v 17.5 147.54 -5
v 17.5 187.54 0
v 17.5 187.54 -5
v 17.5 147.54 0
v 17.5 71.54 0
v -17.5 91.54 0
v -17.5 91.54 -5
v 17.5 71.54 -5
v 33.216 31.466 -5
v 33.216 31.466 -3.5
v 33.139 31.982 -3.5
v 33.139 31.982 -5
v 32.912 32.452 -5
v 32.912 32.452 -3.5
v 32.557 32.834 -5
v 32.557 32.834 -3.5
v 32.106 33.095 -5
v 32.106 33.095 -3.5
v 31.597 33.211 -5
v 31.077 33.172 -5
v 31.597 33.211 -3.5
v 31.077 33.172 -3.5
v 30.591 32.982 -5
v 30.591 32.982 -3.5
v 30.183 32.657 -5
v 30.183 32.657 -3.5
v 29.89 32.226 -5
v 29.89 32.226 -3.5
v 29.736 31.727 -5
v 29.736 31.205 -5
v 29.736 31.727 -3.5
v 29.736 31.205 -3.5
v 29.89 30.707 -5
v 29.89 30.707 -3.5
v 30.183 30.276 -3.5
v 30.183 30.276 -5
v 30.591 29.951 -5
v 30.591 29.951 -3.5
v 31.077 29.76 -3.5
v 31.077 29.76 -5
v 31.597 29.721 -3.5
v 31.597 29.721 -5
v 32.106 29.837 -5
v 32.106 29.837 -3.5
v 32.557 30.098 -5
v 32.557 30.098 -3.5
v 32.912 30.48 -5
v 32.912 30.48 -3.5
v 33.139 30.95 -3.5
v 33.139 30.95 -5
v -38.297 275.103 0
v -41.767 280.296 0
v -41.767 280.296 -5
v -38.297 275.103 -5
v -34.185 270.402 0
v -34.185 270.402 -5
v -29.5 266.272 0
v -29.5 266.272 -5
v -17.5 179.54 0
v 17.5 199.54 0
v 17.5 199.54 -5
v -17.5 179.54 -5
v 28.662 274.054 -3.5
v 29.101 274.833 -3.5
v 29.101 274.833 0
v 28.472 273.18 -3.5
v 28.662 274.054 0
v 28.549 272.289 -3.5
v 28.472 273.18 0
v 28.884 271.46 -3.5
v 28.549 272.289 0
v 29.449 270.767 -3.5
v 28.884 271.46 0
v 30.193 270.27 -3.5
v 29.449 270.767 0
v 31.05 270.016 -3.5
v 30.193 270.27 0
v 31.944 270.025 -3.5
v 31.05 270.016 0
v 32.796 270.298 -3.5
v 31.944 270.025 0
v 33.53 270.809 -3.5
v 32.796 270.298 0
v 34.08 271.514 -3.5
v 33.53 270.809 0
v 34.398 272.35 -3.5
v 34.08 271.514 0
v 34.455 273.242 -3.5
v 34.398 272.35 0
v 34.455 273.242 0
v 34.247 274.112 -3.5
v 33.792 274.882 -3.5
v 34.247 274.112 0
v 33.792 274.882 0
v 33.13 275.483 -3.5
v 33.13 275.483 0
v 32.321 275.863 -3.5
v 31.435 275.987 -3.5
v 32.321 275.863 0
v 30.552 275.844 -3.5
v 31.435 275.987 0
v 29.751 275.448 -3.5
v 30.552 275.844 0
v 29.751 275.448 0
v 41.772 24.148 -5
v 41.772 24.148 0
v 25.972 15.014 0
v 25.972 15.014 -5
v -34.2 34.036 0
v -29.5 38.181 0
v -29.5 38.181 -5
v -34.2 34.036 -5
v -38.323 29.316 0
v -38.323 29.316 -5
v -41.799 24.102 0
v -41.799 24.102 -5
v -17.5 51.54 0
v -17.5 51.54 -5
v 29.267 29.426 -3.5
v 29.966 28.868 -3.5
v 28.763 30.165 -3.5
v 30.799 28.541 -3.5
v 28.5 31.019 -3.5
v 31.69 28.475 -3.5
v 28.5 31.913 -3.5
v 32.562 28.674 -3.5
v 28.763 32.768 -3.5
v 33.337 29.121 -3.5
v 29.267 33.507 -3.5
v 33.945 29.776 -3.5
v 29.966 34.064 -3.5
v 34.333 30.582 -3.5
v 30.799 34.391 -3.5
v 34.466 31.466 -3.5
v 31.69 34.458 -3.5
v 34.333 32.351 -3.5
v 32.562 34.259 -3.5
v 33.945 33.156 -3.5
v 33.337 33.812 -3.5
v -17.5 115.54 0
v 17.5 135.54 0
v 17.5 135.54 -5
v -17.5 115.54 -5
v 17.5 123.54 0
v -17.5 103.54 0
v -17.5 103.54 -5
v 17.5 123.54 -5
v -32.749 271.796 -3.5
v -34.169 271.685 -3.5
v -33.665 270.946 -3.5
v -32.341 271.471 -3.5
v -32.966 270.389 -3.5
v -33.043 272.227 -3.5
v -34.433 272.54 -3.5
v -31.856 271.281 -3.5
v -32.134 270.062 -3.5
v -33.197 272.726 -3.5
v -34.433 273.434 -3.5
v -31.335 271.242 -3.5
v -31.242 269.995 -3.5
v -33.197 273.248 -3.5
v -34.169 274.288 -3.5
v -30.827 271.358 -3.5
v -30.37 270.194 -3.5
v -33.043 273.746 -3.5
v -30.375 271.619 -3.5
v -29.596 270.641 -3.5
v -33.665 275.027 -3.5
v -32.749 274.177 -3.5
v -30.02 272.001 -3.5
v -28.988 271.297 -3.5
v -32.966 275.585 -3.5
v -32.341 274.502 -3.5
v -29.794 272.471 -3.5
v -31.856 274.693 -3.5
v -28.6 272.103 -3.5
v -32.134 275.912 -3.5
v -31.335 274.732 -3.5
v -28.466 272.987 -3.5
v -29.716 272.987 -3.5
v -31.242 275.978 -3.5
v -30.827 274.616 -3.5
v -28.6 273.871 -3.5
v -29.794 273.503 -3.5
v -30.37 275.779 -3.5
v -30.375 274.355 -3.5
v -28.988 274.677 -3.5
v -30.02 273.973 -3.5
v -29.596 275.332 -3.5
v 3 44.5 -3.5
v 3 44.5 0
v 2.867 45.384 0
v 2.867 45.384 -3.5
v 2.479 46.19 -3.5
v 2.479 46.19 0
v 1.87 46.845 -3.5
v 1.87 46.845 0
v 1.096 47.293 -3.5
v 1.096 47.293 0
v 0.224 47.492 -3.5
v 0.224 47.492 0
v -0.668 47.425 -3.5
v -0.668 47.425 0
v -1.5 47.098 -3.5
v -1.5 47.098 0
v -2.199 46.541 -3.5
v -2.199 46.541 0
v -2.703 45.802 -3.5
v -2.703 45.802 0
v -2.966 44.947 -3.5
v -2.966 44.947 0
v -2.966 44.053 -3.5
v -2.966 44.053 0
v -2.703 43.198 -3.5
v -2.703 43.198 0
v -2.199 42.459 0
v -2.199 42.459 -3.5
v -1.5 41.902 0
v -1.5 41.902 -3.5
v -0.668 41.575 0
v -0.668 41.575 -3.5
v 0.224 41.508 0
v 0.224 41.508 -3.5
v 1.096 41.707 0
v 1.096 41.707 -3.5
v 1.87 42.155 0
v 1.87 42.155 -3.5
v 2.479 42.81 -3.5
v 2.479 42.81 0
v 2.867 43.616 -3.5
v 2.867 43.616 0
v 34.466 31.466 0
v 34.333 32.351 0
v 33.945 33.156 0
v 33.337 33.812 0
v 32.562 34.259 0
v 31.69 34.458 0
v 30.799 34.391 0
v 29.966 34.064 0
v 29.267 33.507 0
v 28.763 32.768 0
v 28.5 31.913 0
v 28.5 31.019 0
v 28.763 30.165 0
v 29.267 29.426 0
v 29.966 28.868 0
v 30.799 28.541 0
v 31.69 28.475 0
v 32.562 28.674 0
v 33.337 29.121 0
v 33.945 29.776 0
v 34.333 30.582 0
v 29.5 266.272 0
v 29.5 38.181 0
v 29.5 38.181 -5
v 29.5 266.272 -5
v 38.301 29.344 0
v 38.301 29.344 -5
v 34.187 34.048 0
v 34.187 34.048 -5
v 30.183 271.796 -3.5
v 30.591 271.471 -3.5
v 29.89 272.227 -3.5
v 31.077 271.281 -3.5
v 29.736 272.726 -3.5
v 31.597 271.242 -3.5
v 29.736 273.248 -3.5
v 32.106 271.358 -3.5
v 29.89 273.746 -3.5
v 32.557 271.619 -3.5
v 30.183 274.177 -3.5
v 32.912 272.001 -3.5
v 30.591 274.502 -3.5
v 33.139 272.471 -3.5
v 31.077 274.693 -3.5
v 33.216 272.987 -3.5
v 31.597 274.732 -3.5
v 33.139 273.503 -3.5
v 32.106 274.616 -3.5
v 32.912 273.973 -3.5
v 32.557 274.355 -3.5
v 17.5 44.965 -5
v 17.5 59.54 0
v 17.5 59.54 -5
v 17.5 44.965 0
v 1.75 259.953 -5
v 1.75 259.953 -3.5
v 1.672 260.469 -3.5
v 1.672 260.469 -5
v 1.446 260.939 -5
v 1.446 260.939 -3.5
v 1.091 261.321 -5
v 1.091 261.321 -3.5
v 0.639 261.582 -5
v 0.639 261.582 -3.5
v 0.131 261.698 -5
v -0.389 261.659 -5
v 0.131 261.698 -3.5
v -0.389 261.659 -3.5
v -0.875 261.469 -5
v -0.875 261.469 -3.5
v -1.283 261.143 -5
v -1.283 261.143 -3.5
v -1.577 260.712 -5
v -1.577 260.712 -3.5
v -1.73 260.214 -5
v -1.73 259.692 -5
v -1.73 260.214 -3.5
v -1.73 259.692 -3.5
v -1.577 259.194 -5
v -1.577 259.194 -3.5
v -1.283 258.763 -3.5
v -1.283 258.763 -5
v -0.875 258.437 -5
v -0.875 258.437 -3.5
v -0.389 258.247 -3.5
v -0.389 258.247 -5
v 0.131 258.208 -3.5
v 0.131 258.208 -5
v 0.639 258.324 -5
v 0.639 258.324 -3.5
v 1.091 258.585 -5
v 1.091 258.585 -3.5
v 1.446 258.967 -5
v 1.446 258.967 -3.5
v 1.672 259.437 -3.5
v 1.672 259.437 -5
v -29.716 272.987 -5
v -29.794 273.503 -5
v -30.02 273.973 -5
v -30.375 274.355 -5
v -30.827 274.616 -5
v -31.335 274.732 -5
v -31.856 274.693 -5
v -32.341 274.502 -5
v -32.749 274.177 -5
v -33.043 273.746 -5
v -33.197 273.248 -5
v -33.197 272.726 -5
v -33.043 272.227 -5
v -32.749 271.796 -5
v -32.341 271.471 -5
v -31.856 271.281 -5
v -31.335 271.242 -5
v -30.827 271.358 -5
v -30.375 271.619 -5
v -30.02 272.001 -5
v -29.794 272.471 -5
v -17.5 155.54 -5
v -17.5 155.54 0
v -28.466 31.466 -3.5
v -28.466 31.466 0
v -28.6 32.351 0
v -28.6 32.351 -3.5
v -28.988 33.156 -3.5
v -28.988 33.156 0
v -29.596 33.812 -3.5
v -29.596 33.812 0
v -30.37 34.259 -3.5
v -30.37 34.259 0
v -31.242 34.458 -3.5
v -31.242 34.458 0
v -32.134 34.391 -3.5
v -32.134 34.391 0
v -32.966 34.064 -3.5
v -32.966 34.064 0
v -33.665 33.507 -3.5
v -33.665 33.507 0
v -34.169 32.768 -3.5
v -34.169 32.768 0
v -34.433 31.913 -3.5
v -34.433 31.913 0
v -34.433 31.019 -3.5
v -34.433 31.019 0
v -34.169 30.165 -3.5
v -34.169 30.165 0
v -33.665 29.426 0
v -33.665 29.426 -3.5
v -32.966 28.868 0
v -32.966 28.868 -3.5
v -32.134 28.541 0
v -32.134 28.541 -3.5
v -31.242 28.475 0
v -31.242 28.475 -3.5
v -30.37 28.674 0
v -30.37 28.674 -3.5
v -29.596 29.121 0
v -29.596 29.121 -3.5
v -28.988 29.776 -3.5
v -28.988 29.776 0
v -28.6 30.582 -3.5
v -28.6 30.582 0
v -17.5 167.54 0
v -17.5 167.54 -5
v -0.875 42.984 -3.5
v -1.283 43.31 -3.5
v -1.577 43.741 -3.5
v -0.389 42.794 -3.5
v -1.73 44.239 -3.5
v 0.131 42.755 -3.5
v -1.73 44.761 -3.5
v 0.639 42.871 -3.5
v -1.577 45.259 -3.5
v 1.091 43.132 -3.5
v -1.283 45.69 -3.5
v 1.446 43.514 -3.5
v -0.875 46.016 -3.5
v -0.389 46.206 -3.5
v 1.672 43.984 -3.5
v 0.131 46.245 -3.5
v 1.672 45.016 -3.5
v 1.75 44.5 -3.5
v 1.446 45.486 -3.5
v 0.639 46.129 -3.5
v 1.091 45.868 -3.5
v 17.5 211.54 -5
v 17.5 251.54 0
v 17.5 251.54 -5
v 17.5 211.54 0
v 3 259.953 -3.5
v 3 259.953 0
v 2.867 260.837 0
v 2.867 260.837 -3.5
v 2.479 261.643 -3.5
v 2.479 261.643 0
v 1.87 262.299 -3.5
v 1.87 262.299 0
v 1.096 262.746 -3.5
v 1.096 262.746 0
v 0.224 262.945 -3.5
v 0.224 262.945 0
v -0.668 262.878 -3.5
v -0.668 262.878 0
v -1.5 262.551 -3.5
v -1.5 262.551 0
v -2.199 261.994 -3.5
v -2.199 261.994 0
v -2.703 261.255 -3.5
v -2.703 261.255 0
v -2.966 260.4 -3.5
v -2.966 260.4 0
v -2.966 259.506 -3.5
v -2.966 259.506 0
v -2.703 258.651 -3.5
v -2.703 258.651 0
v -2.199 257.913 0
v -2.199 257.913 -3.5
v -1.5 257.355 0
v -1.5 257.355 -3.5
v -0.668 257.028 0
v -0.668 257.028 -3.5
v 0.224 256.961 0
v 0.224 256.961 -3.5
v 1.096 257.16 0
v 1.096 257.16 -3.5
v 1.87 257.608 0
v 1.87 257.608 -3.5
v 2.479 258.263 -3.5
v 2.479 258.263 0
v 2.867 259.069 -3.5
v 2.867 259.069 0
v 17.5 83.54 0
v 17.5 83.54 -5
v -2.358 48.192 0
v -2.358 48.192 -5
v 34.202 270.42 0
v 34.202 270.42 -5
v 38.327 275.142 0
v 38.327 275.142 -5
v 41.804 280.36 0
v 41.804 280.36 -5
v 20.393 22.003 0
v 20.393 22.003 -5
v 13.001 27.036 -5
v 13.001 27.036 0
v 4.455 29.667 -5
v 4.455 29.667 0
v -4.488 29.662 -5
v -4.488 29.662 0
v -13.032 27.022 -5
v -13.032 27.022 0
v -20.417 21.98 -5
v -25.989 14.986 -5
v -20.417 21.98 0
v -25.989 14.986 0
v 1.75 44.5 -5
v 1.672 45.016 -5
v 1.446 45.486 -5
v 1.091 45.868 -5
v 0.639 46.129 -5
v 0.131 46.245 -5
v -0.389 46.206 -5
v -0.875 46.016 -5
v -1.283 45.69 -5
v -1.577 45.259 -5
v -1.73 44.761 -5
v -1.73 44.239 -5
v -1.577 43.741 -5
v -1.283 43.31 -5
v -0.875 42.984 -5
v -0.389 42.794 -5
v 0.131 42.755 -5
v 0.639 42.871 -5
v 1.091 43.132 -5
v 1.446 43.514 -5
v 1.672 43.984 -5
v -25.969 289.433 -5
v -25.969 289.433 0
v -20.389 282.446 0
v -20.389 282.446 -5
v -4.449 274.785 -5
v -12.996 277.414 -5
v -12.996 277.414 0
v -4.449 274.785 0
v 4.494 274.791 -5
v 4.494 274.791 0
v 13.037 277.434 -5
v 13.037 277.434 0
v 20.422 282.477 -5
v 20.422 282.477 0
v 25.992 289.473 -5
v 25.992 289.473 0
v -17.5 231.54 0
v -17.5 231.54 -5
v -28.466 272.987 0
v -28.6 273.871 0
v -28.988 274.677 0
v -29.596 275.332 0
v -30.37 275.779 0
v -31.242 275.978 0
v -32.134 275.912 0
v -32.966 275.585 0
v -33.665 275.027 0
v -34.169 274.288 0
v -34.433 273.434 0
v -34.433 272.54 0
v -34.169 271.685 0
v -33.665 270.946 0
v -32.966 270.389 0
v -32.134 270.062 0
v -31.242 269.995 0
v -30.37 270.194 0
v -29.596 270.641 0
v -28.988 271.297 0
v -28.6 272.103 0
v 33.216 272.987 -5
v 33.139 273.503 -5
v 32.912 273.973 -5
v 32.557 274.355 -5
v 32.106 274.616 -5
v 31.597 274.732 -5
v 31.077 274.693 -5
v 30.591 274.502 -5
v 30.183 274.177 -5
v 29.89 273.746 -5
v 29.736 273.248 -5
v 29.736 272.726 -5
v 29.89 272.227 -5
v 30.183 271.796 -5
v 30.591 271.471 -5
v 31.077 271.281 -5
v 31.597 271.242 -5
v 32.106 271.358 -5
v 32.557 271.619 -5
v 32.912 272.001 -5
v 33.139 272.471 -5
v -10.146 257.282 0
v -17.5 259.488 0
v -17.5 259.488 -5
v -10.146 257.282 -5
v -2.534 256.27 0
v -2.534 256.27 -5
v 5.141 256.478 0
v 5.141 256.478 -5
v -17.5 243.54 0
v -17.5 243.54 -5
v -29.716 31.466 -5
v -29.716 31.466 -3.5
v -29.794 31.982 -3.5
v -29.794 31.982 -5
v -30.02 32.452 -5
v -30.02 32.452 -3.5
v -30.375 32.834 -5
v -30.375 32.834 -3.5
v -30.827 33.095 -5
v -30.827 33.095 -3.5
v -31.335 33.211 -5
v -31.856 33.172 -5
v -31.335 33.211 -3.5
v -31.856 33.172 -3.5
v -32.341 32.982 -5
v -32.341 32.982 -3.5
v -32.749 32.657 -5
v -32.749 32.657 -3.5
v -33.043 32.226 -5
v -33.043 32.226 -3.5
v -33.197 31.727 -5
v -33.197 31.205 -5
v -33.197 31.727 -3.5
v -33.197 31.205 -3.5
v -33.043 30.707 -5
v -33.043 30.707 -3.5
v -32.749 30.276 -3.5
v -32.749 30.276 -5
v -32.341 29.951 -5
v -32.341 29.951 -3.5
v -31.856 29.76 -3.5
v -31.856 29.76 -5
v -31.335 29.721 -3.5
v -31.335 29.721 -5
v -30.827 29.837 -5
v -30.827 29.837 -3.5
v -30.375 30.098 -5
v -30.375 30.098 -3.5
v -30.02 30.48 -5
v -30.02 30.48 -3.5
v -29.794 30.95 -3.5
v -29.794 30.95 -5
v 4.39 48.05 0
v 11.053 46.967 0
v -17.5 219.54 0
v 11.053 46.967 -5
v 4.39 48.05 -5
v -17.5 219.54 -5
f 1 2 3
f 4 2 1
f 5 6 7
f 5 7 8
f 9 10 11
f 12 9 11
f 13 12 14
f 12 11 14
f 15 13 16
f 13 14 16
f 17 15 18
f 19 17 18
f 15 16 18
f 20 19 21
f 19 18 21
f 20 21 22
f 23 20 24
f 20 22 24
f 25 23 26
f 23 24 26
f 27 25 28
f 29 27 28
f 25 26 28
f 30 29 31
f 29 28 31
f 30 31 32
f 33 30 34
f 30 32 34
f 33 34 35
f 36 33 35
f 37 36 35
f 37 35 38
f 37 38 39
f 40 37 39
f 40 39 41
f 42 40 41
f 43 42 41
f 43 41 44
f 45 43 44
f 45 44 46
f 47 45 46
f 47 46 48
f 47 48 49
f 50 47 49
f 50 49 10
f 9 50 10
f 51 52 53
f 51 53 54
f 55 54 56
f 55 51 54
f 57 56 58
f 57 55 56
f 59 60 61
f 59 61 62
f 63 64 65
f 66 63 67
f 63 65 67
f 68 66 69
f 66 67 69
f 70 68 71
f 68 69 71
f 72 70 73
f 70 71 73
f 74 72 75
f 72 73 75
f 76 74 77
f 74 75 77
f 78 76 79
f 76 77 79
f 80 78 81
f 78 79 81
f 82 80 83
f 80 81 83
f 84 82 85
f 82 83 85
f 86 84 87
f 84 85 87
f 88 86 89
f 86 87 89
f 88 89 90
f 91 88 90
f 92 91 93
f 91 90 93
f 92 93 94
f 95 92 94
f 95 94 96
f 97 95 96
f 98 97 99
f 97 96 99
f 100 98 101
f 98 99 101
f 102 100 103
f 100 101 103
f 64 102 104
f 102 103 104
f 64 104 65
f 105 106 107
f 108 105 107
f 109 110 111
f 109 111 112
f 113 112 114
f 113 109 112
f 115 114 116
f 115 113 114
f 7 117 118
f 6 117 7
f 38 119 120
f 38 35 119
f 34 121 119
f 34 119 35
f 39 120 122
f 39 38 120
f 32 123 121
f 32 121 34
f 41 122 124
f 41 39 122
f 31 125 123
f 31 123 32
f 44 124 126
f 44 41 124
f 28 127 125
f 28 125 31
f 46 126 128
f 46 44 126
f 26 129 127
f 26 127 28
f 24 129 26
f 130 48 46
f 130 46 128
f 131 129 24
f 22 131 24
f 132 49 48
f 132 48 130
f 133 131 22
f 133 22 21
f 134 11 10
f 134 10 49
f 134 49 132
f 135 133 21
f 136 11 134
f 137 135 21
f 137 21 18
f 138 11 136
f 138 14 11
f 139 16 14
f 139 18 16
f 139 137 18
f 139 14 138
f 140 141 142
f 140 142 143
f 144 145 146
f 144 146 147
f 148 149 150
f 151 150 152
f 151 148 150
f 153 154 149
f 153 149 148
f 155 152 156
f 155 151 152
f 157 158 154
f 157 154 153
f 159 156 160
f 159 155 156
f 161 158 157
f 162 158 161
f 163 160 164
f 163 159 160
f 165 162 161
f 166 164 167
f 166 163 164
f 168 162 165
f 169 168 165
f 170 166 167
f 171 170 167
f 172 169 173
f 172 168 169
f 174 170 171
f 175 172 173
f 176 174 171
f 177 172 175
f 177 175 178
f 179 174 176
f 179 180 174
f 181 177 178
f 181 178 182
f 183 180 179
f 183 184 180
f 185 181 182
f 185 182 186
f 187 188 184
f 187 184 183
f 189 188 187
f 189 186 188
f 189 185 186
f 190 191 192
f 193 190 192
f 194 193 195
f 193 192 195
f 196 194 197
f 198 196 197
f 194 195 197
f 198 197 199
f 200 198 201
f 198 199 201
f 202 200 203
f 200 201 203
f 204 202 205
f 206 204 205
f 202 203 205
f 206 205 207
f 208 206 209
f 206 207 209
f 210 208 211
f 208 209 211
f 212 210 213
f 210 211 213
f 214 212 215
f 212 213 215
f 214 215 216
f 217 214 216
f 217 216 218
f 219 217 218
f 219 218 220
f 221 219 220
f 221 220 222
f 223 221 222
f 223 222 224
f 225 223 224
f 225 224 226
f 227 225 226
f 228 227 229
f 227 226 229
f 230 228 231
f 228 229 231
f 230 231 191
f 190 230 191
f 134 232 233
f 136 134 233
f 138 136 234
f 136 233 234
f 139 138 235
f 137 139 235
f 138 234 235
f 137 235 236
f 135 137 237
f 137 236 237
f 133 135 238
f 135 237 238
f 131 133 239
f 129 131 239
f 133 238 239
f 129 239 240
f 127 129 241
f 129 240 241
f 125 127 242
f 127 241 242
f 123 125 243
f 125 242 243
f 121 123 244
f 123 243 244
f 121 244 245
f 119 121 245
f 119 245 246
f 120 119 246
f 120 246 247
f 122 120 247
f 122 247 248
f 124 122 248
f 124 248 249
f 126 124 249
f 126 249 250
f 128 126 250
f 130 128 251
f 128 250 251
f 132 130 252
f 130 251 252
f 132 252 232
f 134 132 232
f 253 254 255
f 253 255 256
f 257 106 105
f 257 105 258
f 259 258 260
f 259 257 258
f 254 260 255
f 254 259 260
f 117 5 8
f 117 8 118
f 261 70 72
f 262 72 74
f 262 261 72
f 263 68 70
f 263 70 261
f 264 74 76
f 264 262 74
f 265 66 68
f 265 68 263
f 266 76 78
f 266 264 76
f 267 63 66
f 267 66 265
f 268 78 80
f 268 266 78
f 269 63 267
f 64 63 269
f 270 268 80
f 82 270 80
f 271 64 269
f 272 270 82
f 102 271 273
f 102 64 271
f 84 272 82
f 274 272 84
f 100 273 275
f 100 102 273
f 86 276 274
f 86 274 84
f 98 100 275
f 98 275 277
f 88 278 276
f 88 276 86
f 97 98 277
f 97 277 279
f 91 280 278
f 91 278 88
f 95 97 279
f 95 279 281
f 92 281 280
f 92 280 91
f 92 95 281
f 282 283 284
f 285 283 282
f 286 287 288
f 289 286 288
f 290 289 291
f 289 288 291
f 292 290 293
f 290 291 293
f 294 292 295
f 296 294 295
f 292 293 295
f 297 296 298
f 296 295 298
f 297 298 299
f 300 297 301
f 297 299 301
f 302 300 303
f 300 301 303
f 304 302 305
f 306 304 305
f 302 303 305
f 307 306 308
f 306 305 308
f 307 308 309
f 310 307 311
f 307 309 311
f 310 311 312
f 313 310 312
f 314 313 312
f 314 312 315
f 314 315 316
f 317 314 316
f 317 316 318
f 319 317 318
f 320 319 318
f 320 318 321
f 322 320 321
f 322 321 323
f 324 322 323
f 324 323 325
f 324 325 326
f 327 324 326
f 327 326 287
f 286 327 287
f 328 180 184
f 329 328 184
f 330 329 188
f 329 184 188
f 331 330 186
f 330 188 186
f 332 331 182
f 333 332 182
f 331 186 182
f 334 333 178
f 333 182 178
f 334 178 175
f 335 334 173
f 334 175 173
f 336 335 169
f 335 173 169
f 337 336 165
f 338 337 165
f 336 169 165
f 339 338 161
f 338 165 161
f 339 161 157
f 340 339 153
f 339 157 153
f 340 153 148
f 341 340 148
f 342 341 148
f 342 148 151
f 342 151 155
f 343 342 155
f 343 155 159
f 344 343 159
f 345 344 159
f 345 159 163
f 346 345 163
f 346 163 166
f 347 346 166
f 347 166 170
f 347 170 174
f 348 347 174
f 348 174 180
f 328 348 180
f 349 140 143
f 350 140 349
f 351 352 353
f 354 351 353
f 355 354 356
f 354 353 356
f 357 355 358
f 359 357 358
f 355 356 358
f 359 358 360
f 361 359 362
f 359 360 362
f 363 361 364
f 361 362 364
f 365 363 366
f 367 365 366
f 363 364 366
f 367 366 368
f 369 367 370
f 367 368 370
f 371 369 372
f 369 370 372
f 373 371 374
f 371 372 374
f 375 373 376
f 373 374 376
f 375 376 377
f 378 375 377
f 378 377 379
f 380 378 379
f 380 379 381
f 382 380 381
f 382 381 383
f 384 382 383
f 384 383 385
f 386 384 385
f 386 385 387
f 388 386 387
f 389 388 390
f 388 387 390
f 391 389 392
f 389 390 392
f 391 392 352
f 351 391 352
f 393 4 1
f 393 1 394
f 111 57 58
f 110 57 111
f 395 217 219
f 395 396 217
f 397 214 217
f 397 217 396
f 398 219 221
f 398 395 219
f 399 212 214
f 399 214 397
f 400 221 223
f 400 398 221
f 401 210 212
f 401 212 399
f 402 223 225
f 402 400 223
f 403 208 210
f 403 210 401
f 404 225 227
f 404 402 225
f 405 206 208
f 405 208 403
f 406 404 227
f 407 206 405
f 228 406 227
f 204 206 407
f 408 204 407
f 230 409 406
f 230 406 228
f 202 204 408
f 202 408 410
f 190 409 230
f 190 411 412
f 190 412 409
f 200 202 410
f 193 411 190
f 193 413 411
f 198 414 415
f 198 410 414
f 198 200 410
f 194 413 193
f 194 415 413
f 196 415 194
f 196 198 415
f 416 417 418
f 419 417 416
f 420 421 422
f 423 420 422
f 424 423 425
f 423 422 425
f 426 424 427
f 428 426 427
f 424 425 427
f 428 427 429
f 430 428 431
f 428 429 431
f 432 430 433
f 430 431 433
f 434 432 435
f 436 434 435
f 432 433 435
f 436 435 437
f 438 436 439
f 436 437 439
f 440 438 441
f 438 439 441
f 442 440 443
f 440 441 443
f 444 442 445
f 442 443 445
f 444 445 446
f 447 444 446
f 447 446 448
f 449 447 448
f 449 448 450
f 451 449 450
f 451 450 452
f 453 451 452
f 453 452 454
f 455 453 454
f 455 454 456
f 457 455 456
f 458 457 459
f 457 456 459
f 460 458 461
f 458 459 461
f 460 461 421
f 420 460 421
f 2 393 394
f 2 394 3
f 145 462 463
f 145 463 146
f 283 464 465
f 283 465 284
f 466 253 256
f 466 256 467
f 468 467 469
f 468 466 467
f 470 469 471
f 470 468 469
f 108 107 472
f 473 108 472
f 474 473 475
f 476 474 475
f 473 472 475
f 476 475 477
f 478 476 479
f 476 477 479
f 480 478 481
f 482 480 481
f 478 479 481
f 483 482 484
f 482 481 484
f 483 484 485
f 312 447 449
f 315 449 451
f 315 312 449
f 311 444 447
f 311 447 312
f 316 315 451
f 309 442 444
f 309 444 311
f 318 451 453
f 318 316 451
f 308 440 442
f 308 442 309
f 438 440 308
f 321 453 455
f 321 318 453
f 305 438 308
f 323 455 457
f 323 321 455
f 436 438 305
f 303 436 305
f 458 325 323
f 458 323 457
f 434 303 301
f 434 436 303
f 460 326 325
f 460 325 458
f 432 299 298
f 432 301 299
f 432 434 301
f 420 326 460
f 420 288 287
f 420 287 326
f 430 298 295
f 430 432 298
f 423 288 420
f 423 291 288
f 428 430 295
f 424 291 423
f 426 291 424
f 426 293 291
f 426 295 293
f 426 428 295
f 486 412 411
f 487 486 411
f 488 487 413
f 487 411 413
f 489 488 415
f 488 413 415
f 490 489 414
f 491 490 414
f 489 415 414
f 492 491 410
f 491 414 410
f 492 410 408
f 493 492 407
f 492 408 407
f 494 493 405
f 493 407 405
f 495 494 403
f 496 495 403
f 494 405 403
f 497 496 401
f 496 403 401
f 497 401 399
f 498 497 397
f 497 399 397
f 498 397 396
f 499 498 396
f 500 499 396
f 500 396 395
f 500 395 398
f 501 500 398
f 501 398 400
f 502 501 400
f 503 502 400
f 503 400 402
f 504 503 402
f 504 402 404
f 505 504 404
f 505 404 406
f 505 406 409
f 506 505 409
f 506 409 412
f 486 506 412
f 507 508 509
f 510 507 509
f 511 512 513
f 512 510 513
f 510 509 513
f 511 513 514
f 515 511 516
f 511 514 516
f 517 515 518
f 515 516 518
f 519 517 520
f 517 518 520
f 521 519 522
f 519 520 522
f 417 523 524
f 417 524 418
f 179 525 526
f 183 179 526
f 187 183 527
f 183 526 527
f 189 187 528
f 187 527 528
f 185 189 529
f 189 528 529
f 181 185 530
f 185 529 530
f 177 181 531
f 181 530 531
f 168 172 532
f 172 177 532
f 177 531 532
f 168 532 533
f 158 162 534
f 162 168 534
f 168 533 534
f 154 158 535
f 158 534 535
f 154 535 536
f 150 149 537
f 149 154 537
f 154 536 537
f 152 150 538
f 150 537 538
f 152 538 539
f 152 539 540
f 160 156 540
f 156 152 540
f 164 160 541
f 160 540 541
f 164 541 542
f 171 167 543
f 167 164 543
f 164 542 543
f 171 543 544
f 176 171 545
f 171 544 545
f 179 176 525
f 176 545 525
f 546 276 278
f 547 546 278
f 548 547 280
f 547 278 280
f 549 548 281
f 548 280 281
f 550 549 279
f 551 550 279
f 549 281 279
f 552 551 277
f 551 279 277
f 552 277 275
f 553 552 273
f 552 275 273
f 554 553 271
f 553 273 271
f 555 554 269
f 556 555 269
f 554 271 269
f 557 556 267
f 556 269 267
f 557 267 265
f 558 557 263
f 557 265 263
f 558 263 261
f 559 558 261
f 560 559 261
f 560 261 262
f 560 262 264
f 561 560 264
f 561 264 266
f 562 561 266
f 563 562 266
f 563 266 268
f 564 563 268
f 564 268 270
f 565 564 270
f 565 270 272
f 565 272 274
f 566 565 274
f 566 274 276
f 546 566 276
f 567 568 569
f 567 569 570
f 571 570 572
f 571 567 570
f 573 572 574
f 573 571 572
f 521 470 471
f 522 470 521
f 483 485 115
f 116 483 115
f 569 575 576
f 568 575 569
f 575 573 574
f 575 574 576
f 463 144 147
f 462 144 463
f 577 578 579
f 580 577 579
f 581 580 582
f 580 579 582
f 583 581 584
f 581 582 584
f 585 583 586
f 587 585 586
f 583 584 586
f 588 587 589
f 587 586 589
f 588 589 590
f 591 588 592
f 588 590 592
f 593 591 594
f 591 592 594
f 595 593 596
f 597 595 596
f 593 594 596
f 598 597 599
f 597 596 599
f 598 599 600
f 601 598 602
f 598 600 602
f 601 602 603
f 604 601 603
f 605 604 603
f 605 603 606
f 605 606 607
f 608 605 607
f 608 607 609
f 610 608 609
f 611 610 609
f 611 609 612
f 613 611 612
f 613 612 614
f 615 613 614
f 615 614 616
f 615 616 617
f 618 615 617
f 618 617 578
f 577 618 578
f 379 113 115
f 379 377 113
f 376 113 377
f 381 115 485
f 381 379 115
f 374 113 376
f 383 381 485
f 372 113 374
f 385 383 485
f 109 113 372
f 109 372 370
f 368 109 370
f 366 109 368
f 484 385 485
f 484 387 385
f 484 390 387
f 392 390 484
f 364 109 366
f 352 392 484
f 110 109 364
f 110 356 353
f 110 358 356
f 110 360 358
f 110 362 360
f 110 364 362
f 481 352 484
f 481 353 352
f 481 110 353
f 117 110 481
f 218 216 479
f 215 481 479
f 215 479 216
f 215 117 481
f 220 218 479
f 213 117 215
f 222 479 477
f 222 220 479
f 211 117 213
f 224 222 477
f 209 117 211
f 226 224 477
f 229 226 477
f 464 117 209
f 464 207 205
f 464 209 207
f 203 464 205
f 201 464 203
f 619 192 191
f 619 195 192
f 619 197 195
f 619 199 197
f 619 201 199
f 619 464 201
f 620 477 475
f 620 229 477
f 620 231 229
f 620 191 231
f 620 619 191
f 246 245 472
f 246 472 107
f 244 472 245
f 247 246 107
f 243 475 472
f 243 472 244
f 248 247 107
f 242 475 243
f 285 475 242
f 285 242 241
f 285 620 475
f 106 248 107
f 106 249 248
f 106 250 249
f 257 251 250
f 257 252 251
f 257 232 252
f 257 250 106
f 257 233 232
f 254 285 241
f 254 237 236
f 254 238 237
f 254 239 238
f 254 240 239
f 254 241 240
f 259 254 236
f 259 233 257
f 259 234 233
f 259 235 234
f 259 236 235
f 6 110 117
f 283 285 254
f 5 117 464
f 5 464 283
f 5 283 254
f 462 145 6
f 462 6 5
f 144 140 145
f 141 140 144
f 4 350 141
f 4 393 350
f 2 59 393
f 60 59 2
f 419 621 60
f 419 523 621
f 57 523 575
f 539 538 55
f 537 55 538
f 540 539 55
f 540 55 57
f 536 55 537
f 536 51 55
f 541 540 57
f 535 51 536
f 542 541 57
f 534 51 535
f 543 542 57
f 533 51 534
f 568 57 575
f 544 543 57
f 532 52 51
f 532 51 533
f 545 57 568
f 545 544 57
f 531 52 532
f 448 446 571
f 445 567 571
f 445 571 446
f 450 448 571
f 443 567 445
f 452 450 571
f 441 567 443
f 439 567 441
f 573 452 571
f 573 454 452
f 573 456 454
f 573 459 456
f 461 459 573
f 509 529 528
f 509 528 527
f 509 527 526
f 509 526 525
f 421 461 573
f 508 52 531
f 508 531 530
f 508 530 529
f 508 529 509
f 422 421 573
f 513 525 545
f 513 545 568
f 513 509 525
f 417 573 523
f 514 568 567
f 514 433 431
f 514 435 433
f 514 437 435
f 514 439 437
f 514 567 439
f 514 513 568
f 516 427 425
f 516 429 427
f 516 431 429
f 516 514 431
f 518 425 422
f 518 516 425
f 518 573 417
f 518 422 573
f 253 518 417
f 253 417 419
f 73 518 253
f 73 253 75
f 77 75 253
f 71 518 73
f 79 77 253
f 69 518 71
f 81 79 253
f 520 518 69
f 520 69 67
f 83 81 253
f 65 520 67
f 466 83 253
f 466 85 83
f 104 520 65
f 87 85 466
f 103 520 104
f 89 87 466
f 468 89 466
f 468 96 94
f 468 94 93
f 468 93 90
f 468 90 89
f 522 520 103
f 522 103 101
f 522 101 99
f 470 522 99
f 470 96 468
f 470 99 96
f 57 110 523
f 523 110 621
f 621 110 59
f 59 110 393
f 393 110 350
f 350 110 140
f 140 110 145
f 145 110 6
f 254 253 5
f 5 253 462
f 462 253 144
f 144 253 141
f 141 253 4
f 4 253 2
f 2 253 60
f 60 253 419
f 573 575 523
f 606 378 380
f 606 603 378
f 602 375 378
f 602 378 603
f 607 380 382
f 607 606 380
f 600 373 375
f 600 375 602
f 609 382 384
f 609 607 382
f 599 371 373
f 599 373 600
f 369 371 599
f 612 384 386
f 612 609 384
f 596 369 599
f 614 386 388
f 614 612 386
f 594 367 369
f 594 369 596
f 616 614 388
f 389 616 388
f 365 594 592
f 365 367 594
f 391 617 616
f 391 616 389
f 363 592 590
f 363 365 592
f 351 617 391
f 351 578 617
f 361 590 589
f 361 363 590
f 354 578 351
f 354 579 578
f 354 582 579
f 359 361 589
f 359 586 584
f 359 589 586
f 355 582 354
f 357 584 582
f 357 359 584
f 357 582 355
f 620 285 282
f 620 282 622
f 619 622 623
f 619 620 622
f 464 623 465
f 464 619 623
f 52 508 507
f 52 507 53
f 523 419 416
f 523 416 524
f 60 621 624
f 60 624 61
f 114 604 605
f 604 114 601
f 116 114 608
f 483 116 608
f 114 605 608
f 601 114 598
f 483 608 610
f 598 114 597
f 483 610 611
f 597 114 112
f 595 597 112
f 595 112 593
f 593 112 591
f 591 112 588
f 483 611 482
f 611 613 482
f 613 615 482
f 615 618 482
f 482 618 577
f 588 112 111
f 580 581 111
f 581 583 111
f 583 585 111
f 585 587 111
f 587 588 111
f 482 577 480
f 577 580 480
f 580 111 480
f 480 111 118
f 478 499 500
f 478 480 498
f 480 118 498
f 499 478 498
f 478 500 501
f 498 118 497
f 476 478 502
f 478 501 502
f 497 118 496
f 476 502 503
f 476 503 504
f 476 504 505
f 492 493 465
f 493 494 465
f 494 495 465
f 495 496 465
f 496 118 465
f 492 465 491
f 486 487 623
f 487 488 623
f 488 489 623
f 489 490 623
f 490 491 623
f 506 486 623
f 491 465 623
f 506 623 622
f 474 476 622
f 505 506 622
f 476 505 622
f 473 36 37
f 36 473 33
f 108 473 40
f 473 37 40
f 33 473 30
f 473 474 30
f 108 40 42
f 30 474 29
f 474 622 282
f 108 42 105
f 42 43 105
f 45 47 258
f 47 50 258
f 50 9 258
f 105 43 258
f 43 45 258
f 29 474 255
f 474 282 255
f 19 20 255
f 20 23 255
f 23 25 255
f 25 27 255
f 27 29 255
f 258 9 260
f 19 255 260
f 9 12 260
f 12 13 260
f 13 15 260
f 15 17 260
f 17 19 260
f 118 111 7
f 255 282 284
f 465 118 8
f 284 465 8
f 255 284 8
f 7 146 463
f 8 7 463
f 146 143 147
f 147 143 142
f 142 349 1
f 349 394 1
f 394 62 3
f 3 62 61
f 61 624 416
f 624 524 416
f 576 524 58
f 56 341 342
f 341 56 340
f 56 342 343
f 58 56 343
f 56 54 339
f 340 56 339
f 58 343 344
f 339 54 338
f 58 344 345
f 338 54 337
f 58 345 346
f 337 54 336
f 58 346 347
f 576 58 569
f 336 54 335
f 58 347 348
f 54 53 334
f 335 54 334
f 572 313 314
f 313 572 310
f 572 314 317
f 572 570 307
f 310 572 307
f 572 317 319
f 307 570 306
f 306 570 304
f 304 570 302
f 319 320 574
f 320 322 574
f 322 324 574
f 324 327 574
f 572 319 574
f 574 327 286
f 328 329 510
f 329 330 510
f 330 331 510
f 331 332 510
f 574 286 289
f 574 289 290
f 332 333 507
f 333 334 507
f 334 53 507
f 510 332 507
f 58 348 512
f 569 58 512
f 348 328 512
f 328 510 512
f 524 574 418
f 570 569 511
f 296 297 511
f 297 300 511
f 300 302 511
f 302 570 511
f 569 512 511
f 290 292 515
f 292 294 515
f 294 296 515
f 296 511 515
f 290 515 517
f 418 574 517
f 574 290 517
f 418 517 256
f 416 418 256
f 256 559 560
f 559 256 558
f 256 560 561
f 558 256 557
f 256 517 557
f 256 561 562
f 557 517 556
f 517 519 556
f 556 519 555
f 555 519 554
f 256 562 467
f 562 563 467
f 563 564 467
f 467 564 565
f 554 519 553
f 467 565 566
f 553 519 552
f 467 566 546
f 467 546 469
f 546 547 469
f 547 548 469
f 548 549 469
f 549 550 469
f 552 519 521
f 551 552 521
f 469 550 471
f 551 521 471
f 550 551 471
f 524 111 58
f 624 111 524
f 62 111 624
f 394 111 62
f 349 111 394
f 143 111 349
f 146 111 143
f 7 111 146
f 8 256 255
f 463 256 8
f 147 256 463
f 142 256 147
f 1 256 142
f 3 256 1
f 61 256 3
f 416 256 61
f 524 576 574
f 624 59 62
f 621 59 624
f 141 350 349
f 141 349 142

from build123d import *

# Parameters (mm, degrees)
SKETCH1_R           = 48.25
BOSS_EXTRUDE1_DEPTH = 5
SKETCH2_W           = 17.162038191
SKETCH2_H           = 56.822210482
SKETCH2_W_2         = 16.152506533
SKETCH2_H_2         = 65.186901365
CUT_EXTRUDE1_DEPTH  = 8
SKETCH3_R           = 30
CUT_EXTRUDE2_DEPTH  = 8
SKETCH4_R           = 1.75
CUT_EXTRUDE3_DEPTH  = 10
SKETCH9_R           = 3
CUT_EXTRUDE4_DEPTH  = 3.5
SKETCH12_R          = 48.25
BOSS_EXTRUDE4_DEPTH = 5
SKETCH13_W          = 17.162038191
SKETCH13_H          = 240.265998925
SKETCH13_W_2        = 16.152506533
SKETCH13_H_2        = 226.18217938
CUT_EXTRUDE5_DEPTH  = 5
SKETCH14_R          = 30
CUT_EXTRUDE6_DEPTH  = 5
CUT_EXTRUDE7_DEPTH  = 5
CUT_EXTRUDE8_DEPTH  = 5
SKETCH19_R          = 1.75
CUT_EXTRUDE9_DEPTH  = 5
SKETCH20_R          = 3
CUT_EXTRUDE10_DEPTH = 3.5
BOSS_EXTRUDE5_DEPTH = 5
SKETCH21_R          = 30
CUT_EXTRUDE11_DEPTH = 5
SKETCH22_R          = 3
CUT_EXTRUDE12_DEPTH = 3.5


with BuildPart() as part:
    # Sketch1 → Boss-Extrude1 (new body)
    with BuildSketch(Plane.XY):
        Circle(SKETCH1_R)
    extrude(amount=-BOSS_EXTRUDE1_DEPTH)

    # Sketch2 → Cut-Extrude1 (cut)
    with BuildSketch(Plane.XY):
        with Locations((-54.831019095, 0)):
            Rectangle(SKETCH2_W, SKETCH2_H)
        with Locations((54.326253267, -4.182345442)):
            Rectangle(SKETCH2_W_2, SKETCH2_H_2)
    extrude(amount=-CUT_EXTRUDE1_DEPTH, mode=Mode.SUBTRACT)

    # Sketch3 → Cut-Extrude2 (cut)
    with BuildSketch(Plane.XY):
        Circle(SKETCH3_R)
    extrude(amount=-CUT_EXTRUDE2_DEPTH, mode=Mode.SUBTRACT)

    # Sketch4 → Cut-Extrude3 (cut)
    with BuildSketch(Plane.XY):
        with Locations((-42.5, 0)):
            Circle(SKETCH4_R)
        with Locations((0, -44.5)):
            Circle(SKETCH4_R)
        with Locations((0, 44.5)):
            Circle(SKETCH4_R)
        with Locations((42.5, 0)):
            Circle(SKETCH4_R)
        with Locations((-31.466251763, -31.466251763)):
            Circle(SKETCH4_R)
        with Locations((31.466251763, -31.466251763)):
            Circle(SKETCH4_R)
        with Locations((31.466251763, 31.466251763)):
            Circle(SKETCH4_R)
        with Locations((-31.466251763, 31.466251763)):
            Circle(SKETCH4_R)
    extrude(amount=-CUT_EXTRUDE3_DEPTH, mode=Mode.SUBTRACT)

    # Sketch9 → Cut-Extrude4 (cut)
    with BuildSketch(Plane.XY):
        with Locations((-42.5, 0)):
            Circle(SKETCH9_R)
        with Locations((42.5, 0)):
            Circle(SKETCH9_R)
        with Locations((31.466251763, 31.466251763)):
            Circle(SKETCH9_R)
        with Locations((-31.466251763, 31.466251763)):
            Circle(SKETCH9_R)
        with Locations((-31.466251763, -31.466251763)):
            Circle(SKETCH9_R)
        with Locations((31.466251763, -31.466251763)):
            Circle(SKETCH9_R)
        with Locations((0, -44.5)):
            Circle(SKETCH9_R)
        with Locations((0, 44.5)):
            Circle(SKETCH9_R)
    extrude(amount=-CUT_EXTRUDE4_DEPTH, mode=Mode.SUBTRACT)

    # Sketch17 → Cut-Extrude7 (cut)
    with BuildSketch(Plane.XY):
        Polygon((0, 0), (-69.304284442, 39.961433382), (-69.278270797, -65.322297693), (63.970930278, -62.407226987), (69.259758702, 40.038554227), align=None)
    extrude(amount=-CUT_EXTRUDE7_DEPTH, mode=Mode.SUBTRACT)



with BuildPart() as body_2:
    # Sketch12 → Boss-Extrude4 (new body)
    with BuildSketch(Plane.XY):
        with Locations((0, 304.453033425)):
            Circle(SKETCH12_R)
    extrude(amount=-BOSS_EXTRUDE4_DEPTH)

    # Sketch13 → Cut-Extrude5 (cut)
    with BuildSketch(Plane.XY):
        with Locations((-54.831019095, 316.834631882)):
            Rectangle(SKETCH13_W, SKETCH13_H)
        with Locations((54.326253267, 300.281083797)):
            Rectangle(SKETCH13_W_2, SKETCH13_H_2)
    extrude(amount=-CUT_EXTRUDE5_DEPTH, mode=Mode.SUBTRACT)

    # Sketch14 → Cut-Extrude6 (cut)
    with BuildSketch(Plane.XY):
        with Locations((0, 304.453033425)):
            Circle(SKETCH14_R)
    extrude(amount=-CUT_EXTRUDE6_DEPTH, mode=Mode.SUBTRACT)

    # Sketch18 → Cut-Extrude8 (cut)
    with BuildSketch(Plane.XY):
        Polygon((0, 304.453033425), (-69.251773631, 264.400669588), (-69.066382196, 357.511219566), (54.70167511, 362.333351669), (69.31225138, 264.505420122), align=None)
    extrude(amount=-CUT_EXTRUDE8_DEPTH, mode=Mode.SUBTRACT)

    # Sketch19 → Cut-Extrude9 (cut)
    with BuildSketch(Plane.XY):
        with Locations((0, 259.953033425)):
            Circle(SKETCH19_R)
        with Locations((-31.466251763, 272.986781662)):
            Circle(SKETCH19_R)
        with Locations((31.466251763, 272.986781662)):
            Circle(SKETCH19_R)
    extrude(amount=-CUT_EXTRUDE9_DEPTH, mode=Mode.SUBTRACT)

    # Sketch20 → Cut-Extrude10 (cut)
    with BuildSketch(Plane.XY):
        with Locations((-31.466251763, 272.986781662)):
            Circle(SKETCH20_R)
        with Locations((0, 259.953033425)):
            Circle(SKETCH20_R)
        with Locations((31.466251763, 272.986781662)):
            Circle(SKETCH20_R)
    extrude(amount=-CUT_EXTRUDE10_DEPTH, mode=Mode.SUBTRACT)


with BuildPart() as part_1:
    add(part.part)

    add(body_2.part)  # Boss-Extrude5 merges body 2
    # Sketch10 → Boss-Extrude5 (add)
    # profile 1 of 4: a face of its own
    with BuildSketch(Plane.XY):
        with BuildLine():
            Line((-17.5, 243.53997423), (-17.5, 259.48846404))
            ThreePointArc((-17.5, 259.48846404), (-23.743486454, 262.449350837), (-29.5, 266.271722552))
            Line((-29.5, 266.271722552), (-29.5, 38.181310873))
            ThreePointArc((-29.5, 38.181310873), (-16.697131744, 45.268844601), (-2.358379682, 48.192328697))
            Line((-2.358379682, 48.192328697), (17.5, 59.53997423))
            Line((17.5, 59.53997423), (17.5, 44.964569385))
            ThreePointArc((17.5, 44.964569385), (23.743486454, 42.003682588), (29.5, 38.181310873))
            Line((29.5, 38.181310873), (29.5, 266.271722552))
            ThreePointArc((29.5, 266.271722552), (17.999468175, 259.686062951), (5.141024697, 256.477702628))
            Line((5.141024697, 256.477702628), (-17.5, 243.53997423))
        make_face()
        Polygon((17.5, 251.53997423), (17.5, 211.53997423), (-17.5, 231.53997423), align=None, mode=Mode.SUBTRACT)
        Polygon((17.5, 187.53997423), (17.5, 147.53997423), (-17.5, 167.53997423), align=None, mode=Mode.SUBTRACT)
        Polygon((-17.5, 179.53997423), (-17.5, 219.53997423), (17.5, 199.53997423), align=None, mode=Mode.SUBTRACT)
        Polygon((17.5, 135.53997423), (-17.5, 115.53997423), (-17.5, 155.53997423), align=None, mode=Mode.SUBTRACT)
        Polygon((17.5, 123.53997423), (17.5, 83.53997423), (-17.5, 103.53997423), align=None, mode=Mode.SUBTRACT)
        Polygon((17.5, 71.53997423), (-17.5, 51.53997423), (-17.5, 91.53997423), align=None, mode=Mode.SUBTRACT)
    # profile 2 of 4: a face of its own
    with BuildSketch(Plane.XY):
        with BuildLine():
            ThreePointArc((29.101447707, 274.83277781), (28.479675874, 272.7032954), (29.490995443, 270.728826288))
            ThreePointArc((29.490995443, 270.728826288), (29.367996239, 272.787614912), (29.101447707, 274.83277781))
        make_face()
    # profile 3 of 4: a face of its own
    with BuildSketch(Plane.XY):
        with BuildLine():
            ThreePointArc((-29.101447707, 274.83277781), (-29.367996239, 272.787614912), (-29.490995443, 270.728826288))
            ThreePointArc((-29.490995443, 270.728826288), (-28.479675874, 272.7032954), (-29.101447707, 274.83277781))
        make_face()
    # profile 4 of 4: a face of its own
    with BuildSketch(Plane.XY):
        with BuildLine():
            ThreePointArc((-24.25254041, 286.794769533), (0, 274.453033425), (24.25254041, 286.794769533))
            ThreePointArc((24.25254041, 286.794769533), (0, 299.5), (-24.25254041, 286.794769533))
        make_face()
    extrude(amount=-BOSS_EXTRUDE5_DEPTH)

    # Sketch21 → Cut-Extrude11 (cut)
    with BuildSketch(Plane.XY):
        with Locations((0, 304.453033425)):
            Circle(SKETCH21_R)
    extrude(amount=-CUT_EXTRUDE11_DEPTH, mode=Mode.SUBTRACT)

    # Sketch22 → Cut-Extrude12 (cut)
    with BuildSketch(Plane.XY):
        with Locations((31.466251763, 272.986781662)):
            Circle(SKETCH22_R)
        with Locations((-31.466251763, 272.986781662)):
            Circle(SKETCH22_R)
    extrude(amount=-CUT_EXTRUDE12_DEPTH, mode=Mode.SUBTRACT)


solid = part_1.part
